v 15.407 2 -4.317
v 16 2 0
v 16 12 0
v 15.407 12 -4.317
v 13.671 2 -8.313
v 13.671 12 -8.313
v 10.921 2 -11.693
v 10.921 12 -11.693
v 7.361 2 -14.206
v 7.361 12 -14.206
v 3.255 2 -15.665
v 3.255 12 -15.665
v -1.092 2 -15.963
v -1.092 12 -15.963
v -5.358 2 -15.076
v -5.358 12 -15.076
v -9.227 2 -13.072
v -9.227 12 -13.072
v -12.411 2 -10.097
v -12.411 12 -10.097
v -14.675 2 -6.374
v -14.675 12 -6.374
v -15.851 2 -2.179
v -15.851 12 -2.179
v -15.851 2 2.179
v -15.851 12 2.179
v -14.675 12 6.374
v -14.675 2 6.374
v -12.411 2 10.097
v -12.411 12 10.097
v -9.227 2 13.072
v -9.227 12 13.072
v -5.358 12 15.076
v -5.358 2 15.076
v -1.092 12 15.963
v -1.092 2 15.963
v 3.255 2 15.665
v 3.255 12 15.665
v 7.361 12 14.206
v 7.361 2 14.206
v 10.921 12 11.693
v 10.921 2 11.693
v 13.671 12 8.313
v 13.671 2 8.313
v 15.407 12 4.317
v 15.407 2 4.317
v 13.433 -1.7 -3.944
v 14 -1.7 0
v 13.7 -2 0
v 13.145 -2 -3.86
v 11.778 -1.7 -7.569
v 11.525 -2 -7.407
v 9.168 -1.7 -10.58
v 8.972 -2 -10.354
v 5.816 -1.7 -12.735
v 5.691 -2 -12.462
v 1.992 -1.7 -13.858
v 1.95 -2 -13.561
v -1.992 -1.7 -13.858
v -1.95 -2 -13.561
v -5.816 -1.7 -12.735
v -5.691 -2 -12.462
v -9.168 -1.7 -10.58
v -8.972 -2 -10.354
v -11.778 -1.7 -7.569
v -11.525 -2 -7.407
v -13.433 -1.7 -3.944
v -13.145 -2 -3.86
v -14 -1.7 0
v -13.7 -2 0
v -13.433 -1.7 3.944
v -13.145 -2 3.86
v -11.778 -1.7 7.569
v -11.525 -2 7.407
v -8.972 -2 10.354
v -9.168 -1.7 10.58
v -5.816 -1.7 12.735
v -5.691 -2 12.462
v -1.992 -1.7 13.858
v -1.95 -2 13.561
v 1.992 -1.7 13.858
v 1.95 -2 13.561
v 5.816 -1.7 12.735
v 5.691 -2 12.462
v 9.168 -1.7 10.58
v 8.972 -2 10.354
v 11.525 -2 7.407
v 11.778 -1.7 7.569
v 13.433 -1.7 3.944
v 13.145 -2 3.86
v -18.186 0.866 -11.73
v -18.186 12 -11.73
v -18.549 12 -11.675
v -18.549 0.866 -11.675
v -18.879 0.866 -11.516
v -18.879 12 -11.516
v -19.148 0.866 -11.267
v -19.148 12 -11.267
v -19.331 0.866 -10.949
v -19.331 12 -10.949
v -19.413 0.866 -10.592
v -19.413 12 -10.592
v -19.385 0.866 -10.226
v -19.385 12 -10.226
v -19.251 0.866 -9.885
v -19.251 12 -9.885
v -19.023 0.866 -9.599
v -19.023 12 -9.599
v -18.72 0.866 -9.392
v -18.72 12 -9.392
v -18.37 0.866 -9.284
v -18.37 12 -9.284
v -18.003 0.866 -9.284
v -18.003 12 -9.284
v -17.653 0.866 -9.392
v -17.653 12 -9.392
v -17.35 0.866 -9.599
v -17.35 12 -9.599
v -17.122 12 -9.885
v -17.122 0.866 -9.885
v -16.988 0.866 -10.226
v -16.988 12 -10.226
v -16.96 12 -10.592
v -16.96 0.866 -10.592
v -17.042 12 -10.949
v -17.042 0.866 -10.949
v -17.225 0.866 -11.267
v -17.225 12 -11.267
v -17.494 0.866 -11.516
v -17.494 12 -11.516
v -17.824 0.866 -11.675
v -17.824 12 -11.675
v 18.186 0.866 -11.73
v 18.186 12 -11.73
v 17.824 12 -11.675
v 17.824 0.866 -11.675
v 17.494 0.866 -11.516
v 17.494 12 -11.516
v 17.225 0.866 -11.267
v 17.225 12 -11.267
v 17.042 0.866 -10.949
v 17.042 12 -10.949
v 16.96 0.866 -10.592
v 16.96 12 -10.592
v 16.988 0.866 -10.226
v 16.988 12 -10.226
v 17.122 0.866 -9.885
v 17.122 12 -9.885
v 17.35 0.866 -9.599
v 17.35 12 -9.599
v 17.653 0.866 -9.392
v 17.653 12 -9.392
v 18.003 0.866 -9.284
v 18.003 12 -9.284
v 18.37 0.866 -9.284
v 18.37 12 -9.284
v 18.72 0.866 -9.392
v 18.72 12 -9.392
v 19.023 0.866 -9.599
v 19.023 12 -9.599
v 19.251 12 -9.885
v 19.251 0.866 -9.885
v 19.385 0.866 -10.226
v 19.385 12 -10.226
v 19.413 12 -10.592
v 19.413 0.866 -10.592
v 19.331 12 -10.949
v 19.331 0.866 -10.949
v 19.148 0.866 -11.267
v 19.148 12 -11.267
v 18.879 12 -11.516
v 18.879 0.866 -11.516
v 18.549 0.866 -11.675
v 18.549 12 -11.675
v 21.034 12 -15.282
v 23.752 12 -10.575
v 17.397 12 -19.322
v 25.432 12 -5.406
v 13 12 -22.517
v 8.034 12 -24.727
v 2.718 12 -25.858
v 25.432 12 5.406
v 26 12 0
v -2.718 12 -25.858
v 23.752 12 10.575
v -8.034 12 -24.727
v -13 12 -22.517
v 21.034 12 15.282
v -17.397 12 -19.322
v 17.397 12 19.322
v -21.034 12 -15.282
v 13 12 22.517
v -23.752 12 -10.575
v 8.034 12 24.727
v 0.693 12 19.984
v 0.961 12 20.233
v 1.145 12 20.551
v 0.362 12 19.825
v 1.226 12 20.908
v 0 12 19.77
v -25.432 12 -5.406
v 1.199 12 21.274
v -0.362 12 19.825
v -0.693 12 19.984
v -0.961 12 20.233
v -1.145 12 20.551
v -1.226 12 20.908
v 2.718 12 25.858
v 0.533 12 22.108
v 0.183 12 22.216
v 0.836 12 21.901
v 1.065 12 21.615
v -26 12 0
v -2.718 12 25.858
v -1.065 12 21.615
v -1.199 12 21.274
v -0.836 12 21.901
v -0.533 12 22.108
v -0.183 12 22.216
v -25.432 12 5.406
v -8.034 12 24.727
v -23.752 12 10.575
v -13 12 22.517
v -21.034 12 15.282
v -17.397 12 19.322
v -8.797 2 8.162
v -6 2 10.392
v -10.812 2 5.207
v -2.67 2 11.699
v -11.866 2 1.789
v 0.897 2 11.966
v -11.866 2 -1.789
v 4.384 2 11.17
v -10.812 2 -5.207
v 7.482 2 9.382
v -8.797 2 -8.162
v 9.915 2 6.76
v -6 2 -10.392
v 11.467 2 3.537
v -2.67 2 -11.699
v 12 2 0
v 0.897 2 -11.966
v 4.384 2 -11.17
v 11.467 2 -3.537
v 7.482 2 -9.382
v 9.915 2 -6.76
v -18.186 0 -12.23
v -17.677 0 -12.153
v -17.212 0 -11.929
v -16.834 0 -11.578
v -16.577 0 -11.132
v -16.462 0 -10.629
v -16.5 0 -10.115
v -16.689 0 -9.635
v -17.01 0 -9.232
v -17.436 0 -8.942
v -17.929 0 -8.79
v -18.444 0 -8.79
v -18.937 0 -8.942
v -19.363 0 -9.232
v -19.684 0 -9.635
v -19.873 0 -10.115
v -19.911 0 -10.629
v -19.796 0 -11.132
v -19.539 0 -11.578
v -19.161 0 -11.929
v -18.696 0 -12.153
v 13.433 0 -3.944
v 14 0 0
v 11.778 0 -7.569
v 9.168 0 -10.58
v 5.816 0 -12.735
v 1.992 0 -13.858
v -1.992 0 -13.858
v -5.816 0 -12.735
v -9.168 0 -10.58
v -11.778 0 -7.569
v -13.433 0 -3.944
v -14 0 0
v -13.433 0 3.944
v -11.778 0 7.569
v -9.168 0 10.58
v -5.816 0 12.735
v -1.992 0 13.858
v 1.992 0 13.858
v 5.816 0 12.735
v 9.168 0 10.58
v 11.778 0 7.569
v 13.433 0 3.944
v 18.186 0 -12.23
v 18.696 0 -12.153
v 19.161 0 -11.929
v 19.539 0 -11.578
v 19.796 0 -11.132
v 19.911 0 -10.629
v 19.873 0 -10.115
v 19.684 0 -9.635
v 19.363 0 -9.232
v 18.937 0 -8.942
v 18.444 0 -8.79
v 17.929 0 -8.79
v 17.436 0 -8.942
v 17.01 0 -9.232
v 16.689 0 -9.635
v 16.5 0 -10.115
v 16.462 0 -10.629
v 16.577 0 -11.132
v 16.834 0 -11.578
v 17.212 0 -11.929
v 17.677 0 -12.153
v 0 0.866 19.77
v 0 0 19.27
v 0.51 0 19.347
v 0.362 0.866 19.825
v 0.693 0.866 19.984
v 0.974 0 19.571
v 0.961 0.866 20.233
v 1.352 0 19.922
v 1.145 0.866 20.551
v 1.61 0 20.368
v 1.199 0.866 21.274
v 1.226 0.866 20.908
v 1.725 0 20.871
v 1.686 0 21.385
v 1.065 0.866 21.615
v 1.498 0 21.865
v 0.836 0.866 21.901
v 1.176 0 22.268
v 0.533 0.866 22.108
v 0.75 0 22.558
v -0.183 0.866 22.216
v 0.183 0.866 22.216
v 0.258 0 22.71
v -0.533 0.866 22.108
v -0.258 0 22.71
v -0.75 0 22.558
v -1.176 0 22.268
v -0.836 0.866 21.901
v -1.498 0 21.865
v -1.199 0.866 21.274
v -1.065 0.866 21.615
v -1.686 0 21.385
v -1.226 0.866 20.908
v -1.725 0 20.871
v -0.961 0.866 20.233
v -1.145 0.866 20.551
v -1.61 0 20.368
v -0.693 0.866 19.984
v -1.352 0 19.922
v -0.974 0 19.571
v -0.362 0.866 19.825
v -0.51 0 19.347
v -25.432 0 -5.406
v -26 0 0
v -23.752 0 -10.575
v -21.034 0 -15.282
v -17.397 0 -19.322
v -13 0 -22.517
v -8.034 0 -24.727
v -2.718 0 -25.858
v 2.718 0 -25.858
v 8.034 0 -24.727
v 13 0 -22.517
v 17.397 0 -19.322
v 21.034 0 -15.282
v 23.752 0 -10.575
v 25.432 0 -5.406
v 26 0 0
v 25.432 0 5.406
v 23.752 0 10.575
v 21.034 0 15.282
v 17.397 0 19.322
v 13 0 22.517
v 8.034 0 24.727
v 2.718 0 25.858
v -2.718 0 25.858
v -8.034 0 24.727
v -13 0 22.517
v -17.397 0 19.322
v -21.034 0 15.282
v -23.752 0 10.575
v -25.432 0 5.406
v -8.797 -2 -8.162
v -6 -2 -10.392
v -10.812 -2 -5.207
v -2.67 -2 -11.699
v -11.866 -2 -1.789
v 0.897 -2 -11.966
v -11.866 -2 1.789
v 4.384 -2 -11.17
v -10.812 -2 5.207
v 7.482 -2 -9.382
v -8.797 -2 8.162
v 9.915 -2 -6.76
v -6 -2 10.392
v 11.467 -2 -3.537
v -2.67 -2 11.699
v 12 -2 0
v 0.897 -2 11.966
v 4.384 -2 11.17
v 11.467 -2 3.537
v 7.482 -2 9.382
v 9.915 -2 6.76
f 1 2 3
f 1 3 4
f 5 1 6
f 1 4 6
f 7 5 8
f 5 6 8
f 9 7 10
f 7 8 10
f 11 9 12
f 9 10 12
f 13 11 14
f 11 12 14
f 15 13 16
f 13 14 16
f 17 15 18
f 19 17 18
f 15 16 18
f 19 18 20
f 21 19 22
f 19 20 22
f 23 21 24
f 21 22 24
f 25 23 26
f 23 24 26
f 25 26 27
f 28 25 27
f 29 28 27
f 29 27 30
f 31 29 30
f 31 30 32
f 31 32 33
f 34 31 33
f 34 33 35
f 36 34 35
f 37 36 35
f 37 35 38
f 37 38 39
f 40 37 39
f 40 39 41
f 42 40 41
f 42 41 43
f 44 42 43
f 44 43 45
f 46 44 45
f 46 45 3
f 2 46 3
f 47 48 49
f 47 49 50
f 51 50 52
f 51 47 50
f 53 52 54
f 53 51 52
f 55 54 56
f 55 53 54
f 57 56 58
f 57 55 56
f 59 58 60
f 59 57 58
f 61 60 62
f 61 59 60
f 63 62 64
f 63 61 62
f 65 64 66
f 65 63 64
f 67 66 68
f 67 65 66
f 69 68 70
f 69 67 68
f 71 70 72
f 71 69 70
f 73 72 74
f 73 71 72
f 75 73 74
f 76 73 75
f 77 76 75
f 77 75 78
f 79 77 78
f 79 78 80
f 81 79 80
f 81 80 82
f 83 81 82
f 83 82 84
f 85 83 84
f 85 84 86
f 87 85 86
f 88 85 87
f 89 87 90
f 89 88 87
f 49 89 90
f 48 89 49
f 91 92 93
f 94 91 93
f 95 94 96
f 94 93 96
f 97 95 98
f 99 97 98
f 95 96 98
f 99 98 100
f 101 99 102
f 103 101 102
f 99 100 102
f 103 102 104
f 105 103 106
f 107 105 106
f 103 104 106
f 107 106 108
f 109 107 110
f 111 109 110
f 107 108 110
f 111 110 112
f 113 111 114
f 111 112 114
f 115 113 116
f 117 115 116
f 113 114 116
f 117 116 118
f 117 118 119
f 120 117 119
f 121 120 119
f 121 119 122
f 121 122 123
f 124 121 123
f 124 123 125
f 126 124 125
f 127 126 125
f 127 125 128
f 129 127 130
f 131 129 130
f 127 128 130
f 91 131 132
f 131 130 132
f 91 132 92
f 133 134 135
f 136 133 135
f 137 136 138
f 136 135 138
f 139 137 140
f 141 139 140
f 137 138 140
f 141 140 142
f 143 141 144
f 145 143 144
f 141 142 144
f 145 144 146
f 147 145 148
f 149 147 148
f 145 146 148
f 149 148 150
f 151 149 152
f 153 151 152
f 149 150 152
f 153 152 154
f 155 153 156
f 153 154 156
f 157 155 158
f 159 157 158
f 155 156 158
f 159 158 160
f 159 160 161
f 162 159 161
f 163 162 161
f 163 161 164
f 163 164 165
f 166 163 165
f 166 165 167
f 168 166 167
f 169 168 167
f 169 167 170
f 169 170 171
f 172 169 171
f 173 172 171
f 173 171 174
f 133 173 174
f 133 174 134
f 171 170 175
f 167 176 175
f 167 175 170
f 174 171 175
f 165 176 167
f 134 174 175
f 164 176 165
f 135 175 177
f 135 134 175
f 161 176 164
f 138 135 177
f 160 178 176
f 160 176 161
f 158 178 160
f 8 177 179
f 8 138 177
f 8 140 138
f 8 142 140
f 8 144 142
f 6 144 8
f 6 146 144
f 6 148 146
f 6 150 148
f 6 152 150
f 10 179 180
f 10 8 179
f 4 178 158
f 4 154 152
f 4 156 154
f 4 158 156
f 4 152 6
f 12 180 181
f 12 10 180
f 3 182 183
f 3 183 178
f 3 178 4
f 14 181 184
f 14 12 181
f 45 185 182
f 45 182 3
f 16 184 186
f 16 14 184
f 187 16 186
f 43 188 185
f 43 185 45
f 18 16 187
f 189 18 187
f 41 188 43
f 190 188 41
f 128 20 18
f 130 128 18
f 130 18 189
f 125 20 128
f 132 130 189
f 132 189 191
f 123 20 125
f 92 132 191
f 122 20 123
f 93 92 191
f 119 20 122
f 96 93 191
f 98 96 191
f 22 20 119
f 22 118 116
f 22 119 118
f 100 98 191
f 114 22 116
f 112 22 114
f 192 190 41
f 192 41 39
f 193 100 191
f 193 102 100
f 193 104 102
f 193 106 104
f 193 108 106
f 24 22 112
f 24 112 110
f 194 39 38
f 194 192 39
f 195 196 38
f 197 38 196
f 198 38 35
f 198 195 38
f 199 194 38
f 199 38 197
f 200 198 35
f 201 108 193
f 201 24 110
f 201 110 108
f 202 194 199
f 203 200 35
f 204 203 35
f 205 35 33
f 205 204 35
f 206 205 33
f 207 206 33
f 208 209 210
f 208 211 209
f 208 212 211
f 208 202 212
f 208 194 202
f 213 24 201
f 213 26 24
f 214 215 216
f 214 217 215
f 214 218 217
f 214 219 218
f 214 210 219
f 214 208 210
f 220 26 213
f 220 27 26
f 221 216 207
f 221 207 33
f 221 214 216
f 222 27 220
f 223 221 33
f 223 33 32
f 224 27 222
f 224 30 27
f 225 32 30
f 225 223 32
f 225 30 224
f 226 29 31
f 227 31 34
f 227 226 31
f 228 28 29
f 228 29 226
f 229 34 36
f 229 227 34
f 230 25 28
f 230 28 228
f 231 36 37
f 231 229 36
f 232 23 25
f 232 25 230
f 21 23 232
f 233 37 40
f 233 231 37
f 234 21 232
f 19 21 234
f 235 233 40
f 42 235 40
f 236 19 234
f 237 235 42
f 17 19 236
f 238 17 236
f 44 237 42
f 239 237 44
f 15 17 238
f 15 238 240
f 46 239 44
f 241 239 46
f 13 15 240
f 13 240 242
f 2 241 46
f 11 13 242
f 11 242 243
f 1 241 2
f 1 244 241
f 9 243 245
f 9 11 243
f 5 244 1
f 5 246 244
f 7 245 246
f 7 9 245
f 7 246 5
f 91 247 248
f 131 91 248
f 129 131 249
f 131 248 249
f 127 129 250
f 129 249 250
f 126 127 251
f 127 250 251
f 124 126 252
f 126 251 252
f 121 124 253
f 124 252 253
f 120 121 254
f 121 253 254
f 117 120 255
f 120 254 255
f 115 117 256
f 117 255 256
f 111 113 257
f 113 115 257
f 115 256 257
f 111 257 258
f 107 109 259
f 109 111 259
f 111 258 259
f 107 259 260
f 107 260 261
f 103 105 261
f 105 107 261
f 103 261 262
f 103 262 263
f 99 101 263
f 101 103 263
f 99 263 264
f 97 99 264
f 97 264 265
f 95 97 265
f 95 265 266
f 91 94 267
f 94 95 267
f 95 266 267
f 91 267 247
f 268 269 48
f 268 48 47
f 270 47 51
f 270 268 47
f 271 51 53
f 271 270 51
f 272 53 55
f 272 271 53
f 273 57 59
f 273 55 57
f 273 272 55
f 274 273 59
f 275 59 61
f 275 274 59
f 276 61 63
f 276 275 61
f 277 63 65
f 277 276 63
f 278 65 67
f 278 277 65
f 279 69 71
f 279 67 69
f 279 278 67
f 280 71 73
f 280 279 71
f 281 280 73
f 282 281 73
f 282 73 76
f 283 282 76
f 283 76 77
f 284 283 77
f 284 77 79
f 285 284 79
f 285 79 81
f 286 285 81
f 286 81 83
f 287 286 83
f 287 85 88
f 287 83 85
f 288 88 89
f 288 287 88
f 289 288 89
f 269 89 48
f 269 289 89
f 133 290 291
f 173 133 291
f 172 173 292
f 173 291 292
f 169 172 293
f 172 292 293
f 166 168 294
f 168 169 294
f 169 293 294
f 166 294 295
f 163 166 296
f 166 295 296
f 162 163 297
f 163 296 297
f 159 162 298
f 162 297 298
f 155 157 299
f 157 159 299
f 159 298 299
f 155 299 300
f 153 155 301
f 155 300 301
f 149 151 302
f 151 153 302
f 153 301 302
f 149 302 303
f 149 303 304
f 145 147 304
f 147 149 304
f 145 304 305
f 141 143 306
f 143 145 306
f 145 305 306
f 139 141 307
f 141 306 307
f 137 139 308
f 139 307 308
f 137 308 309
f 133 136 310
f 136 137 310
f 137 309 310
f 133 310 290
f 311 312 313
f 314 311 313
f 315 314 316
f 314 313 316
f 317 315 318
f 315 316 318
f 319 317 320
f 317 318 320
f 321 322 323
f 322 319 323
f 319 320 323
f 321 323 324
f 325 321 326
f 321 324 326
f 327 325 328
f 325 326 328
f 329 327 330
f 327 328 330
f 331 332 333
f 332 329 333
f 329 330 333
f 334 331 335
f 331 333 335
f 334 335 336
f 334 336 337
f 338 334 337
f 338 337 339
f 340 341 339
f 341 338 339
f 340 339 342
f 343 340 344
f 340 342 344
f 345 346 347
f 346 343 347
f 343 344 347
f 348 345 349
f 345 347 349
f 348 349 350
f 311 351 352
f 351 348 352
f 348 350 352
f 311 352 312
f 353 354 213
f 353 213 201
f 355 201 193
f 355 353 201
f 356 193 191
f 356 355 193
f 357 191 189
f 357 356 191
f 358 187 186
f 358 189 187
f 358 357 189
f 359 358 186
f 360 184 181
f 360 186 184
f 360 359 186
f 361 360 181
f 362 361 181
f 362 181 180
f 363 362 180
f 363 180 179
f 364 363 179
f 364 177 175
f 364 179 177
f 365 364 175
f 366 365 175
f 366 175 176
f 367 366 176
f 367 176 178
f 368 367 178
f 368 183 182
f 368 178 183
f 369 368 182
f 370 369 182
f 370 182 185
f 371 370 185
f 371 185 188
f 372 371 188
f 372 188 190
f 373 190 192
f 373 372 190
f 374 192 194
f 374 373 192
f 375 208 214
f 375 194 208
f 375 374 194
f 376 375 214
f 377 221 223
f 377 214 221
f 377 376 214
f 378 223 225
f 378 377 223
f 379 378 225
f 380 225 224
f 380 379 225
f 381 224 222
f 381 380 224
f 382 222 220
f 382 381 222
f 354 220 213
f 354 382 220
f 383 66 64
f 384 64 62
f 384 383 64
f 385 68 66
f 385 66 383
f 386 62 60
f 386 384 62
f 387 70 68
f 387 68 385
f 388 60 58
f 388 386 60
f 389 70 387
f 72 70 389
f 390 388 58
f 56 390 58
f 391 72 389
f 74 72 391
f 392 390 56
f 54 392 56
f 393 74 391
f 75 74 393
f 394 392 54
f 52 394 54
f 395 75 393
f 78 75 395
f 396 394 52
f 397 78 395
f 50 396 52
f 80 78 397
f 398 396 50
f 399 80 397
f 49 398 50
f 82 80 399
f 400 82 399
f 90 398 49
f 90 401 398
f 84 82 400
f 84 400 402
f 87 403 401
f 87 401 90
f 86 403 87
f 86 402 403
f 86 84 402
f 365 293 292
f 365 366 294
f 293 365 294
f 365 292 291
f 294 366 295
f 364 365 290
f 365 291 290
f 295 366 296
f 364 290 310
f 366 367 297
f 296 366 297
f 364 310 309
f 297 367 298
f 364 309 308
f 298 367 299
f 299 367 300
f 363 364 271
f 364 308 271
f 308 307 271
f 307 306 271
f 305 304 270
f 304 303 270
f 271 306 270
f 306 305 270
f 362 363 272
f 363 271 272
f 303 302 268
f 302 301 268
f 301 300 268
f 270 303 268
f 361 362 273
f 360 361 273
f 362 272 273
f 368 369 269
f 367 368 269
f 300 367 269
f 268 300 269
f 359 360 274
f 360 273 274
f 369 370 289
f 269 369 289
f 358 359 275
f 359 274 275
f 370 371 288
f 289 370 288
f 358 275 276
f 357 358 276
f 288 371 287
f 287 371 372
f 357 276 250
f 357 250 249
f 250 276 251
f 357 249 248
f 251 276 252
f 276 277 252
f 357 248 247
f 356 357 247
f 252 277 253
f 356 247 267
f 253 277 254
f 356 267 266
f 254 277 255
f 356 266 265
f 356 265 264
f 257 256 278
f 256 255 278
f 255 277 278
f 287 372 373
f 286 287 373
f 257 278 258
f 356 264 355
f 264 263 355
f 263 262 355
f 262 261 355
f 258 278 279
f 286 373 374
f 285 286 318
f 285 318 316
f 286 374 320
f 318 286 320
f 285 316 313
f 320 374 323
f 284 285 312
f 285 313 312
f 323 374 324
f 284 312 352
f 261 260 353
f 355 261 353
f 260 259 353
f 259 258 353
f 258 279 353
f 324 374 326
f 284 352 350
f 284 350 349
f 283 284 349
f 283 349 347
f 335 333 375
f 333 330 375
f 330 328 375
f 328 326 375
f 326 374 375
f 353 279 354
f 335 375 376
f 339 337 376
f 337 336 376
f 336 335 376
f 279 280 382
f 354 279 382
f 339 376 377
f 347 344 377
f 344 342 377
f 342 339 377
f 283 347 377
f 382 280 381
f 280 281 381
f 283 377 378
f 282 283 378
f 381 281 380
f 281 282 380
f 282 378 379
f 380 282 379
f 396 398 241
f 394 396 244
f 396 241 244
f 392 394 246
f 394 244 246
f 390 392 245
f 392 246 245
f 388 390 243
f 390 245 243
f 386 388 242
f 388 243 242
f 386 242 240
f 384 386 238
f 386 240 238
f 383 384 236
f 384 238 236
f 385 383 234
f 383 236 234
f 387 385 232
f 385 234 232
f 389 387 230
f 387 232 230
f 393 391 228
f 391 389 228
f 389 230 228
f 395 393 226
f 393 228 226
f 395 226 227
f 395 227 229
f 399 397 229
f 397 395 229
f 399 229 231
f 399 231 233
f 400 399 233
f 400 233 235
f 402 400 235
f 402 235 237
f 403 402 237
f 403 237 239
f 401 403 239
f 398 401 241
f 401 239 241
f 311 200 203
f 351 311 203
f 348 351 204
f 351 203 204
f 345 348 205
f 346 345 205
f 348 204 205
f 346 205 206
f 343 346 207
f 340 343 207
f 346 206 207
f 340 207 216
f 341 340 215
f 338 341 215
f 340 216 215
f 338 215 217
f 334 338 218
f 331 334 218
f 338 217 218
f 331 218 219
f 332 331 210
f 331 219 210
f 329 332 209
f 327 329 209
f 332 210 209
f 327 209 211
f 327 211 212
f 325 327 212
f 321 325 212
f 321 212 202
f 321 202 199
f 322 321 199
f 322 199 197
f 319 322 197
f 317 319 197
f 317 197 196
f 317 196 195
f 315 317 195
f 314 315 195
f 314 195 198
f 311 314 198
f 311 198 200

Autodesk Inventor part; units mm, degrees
ref_plane "YZ Plane" through (0, 0, 0) normal (1, 0, 0) x (0, 1, 0)
ref_plane "XZ Plane" through (0, 0, 0) normal (0, 1, 0) x (-1, 0, 0)
ref_plane "XY Plane" through (0, 0, 0) normal (0, 0, 1) x (1, 0, 0)
sketch "Sketch1" plane through (0, 0, 0) normal (0, 1, 0) x (-1, 0, 0)
  circle A0 centre (0, 0) radius 26
  dimension "d0" = 52
extrude "Extrusion1" add sketch "Sketch1" along normal blind 12
sketch "Sketch2" plane through (0, 12, 0) normal (0, 1, 0) x (1, 0, 0)
  circle A0 centre (0, 0) radius 16
  dimension "d3" = 32
extrude "Extrusion2" cut sketch "Sketch2" against normal blind 10
sketch "Sketch3" plane through (0, 2, 0) normal (0, 1, 0) x (1, 0, 0)
  circle A0 centre (0, 0) radius 12
  dimension "d6" = 24
extrude "Extrusion3" cut sketch "Sketch3" against normal through all
sketch "Sketch4" plane through (0, 0, 0) normal (0, -1, 0) x (1, 0, 0)
  circle A0 centre (0, 0) radius 14
  circle A1 centre (0, 0) radius 12 projected
  dimension "d9" = 2
extrude "Extrusion4" add sketch "Sketch4" along normal blind 2
sketch "Sketch5" plane through (0, 0, 0) normal (0, -1, 0) x (1, 0, 0)
  circle A0 centre (0, 0) radius 16 projected
  circle A1 centre (0, 0) radius 16 projected
  circle A2 centre (0, 0) radius 26 projected
  circle A3 centre (0, 0) radius 21 construction
  line L0 (0, 36.4) -> (0, -36.4) construction
  point P0 (0, 21)
  point P1 (-18.1865, -10.5)
  point P2 (18.1865, -10.5)
  dimension "d12" = 5
  dimension "d15" = 360
hole "Hole1" at (0, 0, 21) at (-18.1865, 0, -10.5) at (18.1865, 0, -10.5) direction (0, 1, 0) diameter 2.459 end through all thread size "M3x0.5" class "6H" standard "ISO Metric profile"
chamfer "Chamfer1" distance 0.5 angle 60 3 edges at (0, 0, 22.2295) (-18.1865, 0, -9.2705) (18.1865, 0, -9.2705) measured on face at (-13.3646, 0, -14.7799)
chamfer "Chamfer2" distance 0.3 angle 45 1 edges at (-14, -2, 0)
properties part number "ball bearing mount"
